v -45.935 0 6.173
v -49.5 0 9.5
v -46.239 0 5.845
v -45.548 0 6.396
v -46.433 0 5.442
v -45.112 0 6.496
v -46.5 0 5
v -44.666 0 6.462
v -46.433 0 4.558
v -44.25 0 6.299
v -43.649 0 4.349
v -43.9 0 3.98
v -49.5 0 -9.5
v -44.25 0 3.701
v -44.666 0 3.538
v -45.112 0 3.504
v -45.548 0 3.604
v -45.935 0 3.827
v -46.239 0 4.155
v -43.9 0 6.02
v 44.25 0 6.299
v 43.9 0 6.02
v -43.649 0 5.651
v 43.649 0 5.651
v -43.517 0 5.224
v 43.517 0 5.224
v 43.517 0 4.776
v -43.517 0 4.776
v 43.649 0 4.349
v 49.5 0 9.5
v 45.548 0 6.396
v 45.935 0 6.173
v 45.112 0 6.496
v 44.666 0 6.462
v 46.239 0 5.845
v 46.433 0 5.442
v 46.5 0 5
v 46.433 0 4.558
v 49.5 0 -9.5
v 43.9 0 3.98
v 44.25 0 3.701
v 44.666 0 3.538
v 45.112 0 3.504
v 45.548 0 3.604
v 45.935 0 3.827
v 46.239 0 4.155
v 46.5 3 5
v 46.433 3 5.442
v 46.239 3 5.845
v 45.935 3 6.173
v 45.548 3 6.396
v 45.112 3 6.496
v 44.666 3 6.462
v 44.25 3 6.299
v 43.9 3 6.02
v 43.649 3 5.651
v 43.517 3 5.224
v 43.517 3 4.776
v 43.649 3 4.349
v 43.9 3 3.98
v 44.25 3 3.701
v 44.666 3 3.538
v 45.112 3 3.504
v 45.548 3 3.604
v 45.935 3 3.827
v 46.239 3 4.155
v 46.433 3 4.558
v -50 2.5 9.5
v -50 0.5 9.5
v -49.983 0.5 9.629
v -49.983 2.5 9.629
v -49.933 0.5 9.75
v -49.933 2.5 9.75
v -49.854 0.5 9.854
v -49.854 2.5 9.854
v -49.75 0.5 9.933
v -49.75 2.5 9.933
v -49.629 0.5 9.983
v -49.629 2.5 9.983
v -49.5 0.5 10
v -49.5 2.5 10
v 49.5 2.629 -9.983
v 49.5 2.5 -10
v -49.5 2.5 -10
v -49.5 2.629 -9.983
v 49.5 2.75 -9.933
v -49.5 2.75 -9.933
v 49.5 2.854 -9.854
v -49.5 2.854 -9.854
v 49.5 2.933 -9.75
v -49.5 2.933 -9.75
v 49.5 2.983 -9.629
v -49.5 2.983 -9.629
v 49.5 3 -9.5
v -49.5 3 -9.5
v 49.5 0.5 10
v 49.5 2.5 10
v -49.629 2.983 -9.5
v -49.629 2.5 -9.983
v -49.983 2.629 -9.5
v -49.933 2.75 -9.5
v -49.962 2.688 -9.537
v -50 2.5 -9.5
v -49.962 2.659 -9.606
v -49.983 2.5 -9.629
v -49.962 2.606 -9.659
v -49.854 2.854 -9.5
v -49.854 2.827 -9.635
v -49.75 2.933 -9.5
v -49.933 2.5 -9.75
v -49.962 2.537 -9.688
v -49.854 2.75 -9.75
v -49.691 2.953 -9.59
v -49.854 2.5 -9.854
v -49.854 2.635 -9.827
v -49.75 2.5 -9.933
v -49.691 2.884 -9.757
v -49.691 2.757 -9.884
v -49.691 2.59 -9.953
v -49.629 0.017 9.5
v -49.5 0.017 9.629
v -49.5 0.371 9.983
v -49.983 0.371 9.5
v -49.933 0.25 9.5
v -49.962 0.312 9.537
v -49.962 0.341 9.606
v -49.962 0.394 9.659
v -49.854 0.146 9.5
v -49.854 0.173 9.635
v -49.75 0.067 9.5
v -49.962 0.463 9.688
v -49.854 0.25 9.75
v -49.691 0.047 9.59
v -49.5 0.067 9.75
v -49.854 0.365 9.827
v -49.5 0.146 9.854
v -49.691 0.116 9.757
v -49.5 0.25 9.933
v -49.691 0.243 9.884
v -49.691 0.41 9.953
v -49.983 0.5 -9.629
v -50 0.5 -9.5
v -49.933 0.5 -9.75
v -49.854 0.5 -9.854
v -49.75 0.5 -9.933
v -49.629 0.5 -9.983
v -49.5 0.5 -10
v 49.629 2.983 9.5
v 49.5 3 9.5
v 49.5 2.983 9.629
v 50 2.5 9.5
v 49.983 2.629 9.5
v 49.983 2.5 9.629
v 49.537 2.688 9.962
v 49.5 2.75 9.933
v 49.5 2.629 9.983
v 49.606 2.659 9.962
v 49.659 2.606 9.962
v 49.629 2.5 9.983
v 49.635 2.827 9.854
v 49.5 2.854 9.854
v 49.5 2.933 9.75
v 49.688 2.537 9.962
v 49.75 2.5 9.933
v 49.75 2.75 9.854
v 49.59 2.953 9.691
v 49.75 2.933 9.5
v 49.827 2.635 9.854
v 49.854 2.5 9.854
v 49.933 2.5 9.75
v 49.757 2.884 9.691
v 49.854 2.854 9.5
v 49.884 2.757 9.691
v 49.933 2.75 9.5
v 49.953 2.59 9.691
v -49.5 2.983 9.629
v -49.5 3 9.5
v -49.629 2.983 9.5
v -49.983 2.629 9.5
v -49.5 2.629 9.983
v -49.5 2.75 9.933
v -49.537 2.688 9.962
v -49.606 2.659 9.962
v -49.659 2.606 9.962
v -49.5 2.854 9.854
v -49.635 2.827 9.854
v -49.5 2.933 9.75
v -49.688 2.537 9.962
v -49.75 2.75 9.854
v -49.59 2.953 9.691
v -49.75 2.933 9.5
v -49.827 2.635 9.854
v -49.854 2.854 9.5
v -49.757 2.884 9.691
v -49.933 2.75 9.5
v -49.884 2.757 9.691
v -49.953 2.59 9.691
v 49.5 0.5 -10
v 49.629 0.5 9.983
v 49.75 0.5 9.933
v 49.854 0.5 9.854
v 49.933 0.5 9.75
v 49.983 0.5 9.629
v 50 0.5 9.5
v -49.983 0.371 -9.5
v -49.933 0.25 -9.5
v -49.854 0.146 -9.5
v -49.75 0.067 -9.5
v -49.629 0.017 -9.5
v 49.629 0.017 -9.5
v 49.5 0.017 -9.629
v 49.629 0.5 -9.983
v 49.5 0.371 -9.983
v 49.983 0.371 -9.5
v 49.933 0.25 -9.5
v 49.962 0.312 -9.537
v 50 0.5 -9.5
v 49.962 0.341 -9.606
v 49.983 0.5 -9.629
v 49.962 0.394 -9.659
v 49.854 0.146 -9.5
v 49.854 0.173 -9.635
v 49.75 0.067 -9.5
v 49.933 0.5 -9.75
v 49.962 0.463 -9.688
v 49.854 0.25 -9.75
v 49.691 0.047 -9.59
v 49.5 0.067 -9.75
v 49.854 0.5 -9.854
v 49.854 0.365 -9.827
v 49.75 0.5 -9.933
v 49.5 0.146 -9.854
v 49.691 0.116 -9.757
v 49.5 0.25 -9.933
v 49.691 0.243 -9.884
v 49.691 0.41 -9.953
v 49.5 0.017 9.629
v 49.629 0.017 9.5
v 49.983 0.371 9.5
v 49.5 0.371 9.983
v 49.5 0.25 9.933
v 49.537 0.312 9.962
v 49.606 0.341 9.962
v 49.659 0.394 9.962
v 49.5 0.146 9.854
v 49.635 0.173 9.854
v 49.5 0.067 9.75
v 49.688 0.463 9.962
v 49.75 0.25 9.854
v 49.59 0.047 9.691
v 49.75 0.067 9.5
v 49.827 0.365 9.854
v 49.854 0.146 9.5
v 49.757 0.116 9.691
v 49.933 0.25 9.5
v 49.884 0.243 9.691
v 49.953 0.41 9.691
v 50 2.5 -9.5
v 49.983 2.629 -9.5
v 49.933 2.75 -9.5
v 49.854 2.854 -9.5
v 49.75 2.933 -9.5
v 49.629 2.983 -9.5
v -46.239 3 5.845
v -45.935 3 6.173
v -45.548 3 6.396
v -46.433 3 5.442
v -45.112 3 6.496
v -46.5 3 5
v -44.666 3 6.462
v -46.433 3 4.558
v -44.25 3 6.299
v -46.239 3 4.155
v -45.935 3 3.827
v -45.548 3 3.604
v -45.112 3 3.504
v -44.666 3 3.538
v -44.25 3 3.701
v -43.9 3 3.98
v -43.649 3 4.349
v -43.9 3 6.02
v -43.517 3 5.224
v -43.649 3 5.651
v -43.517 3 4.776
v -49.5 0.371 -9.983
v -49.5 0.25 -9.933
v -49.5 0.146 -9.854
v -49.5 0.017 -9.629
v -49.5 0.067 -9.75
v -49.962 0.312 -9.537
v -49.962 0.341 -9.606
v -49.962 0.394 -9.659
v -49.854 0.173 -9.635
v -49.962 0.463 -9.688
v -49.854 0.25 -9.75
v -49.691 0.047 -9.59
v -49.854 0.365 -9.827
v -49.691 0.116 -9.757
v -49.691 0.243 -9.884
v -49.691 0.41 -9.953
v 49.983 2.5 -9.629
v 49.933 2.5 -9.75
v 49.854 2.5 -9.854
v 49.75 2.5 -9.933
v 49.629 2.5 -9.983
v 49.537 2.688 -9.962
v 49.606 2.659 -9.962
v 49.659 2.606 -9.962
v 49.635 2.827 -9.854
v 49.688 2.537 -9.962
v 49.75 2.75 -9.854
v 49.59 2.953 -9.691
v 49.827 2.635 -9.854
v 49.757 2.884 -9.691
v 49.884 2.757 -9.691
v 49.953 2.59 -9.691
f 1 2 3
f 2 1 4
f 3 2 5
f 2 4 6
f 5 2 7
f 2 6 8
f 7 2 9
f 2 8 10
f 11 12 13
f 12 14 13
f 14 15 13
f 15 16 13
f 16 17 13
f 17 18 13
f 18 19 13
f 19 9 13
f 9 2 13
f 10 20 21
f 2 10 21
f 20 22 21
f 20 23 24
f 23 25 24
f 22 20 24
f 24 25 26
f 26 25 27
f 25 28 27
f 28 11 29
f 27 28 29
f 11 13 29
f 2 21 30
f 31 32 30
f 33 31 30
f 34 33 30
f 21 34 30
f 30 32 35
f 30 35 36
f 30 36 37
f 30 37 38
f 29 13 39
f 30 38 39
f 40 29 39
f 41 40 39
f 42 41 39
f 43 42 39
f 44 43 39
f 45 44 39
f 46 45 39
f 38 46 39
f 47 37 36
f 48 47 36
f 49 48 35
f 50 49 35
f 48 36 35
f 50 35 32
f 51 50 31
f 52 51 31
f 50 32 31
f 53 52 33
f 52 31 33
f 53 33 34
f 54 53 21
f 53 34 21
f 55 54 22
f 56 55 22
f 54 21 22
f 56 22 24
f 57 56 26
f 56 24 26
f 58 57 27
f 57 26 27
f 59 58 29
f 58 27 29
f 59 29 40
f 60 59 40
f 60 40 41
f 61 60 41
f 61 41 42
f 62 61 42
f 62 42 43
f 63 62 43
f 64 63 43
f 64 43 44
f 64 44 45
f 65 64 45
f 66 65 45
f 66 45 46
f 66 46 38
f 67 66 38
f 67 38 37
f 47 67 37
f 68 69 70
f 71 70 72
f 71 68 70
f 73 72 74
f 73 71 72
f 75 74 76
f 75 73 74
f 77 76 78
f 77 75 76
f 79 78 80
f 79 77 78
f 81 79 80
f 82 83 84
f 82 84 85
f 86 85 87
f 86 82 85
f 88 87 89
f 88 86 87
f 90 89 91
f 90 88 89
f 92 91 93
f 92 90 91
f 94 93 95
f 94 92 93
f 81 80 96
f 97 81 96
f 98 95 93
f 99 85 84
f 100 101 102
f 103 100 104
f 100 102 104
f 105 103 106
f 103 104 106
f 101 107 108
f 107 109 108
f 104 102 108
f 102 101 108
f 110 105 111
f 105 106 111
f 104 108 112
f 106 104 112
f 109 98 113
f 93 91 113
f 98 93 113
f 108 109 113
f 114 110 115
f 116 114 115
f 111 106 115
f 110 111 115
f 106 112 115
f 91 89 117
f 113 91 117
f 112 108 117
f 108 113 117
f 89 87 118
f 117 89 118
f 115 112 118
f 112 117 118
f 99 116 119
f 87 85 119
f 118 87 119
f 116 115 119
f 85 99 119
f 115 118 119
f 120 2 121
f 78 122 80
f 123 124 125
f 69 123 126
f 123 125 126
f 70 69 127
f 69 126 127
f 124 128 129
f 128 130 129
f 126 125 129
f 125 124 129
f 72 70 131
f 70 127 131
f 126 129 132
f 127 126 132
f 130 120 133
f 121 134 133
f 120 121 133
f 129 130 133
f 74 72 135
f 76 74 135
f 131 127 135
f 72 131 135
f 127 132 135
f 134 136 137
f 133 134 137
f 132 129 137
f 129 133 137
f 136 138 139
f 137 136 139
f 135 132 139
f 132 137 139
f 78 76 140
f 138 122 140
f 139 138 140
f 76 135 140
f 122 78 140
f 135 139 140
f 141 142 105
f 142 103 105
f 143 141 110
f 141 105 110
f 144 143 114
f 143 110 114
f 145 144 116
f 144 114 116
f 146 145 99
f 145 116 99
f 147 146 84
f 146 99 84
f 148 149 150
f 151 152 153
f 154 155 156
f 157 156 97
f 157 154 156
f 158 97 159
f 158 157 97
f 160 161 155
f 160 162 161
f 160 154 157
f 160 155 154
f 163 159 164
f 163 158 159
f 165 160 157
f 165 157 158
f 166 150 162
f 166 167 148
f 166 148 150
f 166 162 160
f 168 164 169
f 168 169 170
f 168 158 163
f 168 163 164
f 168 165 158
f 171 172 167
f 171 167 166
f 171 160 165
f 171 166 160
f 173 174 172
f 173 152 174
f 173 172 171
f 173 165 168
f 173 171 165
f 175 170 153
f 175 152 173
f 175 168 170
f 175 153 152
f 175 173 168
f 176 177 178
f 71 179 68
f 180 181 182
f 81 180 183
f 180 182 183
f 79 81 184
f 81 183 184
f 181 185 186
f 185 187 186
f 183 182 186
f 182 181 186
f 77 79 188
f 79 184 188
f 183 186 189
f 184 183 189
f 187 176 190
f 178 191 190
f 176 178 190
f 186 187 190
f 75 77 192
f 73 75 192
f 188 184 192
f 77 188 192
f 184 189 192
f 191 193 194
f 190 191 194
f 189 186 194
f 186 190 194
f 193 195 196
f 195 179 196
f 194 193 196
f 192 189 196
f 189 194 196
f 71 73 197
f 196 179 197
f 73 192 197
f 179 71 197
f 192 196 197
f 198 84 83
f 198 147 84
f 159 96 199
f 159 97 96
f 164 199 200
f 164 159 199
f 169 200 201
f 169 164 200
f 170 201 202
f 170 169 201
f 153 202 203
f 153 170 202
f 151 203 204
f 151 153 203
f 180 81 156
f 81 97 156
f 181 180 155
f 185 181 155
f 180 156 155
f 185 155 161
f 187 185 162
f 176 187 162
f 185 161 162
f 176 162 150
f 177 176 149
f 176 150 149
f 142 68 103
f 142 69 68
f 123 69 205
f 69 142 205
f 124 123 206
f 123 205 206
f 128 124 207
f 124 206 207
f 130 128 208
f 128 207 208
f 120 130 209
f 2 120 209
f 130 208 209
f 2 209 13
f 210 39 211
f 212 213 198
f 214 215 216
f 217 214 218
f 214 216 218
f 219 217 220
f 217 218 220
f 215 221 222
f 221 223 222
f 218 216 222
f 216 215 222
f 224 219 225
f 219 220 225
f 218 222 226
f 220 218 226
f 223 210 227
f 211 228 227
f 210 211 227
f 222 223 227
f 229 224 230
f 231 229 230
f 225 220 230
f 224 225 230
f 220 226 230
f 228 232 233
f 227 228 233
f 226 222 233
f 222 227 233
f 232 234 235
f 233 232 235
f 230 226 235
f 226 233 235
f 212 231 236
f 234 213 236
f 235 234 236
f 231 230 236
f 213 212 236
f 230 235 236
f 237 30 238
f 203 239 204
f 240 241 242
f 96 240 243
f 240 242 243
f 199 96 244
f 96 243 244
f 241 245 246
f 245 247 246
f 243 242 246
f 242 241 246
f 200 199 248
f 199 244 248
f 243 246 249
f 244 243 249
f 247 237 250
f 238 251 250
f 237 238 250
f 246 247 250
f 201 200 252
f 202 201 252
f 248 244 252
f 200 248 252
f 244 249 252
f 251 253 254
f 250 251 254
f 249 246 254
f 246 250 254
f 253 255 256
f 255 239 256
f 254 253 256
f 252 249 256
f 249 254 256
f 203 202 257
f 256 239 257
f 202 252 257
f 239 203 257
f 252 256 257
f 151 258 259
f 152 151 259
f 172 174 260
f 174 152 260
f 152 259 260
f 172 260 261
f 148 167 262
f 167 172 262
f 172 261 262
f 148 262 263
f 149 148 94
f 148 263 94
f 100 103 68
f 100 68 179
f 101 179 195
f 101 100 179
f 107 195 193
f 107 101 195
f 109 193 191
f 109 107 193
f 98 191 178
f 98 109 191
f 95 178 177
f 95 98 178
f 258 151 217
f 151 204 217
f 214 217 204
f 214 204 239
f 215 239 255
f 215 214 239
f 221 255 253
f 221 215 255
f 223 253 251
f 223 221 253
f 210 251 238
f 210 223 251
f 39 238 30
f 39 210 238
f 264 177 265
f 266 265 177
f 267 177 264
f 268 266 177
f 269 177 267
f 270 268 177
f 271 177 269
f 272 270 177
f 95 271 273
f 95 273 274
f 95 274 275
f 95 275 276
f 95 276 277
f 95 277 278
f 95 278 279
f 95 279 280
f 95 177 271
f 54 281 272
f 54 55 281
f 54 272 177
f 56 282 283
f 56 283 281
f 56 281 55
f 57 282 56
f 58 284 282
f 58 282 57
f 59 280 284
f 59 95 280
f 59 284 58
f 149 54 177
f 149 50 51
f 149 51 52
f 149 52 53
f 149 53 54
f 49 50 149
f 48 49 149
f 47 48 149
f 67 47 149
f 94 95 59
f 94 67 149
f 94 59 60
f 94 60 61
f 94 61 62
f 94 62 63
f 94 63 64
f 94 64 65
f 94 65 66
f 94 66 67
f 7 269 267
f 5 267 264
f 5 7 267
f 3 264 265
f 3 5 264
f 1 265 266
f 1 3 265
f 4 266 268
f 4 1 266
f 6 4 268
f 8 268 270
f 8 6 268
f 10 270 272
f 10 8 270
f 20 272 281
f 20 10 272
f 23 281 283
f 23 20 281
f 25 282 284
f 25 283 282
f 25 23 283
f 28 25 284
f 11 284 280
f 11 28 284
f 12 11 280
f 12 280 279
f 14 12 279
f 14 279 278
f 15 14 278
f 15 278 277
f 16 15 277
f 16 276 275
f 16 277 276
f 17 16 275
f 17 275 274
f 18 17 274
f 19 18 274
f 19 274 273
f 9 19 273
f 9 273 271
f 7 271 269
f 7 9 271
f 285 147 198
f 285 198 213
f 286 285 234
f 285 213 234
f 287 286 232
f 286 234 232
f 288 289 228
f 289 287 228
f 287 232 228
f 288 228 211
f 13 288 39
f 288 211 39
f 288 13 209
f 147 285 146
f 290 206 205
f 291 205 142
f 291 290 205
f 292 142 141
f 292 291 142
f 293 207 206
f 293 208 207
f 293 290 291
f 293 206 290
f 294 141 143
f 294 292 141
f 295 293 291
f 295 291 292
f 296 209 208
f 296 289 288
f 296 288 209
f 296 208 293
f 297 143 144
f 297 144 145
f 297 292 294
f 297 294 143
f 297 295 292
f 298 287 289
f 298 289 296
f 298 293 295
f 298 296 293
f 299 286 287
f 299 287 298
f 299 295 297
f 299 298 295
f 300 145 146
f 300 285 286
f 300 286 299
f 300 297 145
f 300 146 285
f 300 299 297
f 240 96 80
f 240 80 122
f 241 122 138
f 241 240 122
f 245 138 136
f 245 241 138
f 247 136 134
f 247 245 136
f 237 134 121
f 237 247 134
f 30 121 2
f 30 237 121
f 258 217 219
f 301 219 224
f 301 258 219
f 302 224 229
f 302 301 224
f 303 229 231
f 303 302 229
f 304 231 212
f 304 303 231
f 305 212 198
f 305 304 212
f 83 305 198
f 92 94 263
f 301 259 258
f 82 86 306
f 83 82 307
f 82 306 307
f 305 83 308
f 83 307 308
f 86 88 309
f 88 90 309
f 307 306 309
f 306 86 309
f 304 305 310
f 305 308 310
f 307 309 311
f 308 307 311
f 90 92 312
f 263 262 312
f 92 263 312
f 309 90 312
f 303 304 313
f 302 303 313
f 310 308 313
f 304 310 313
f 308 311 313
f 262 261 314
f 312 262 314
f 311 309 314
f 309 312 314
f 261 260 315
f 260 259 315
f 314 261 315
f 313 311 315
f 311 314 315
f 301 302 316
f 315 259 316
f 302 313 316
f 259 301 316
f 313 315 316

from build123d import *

# Parameters (mm, degrees)
SKETCH1_W           = 100
SKETCH1_H           = 20
BOSS_EXTRUDE1_DEPTH = 3
FILLET1_R           = 0.5
SKETCH2_R           = 1.5
CUT_EXTRUDE1_DEPTH  = 4


with BuildPart() as part:
    # Sketch1 → Boss-Extrude1 (new body)
    with BuildSketch(Plane(origin=(0, 0, 0), x_dir=(1, 0, 0), z_dir=(0, 1, 0))):
        Rectangle(SKETCH1_W, SKETCH1_H)
    extrude(amount=BOSS_EXTRUDE1_DEPTH)

    # Fillet1
    fillet1_edges = [part.edges().sort_by_distance(p)[0] for p in [
        (50, 3, 0),
        (0, 3, -10),
        (-50, 3, 0),
        (0, 0, -10),
        (50, 0, 0),
        (0, 0, 10),
        (-50, 0, 0),
        (0, 3, 10),
        (-50, 1.5, -10),
        (50, 1.5, -10),
        (50, 1.5, 10),
        (-50, 1.5, 10),
    ]]
    fillet(fillet1_edges, radius=FILLET1_R)

    # Sketch2 → Cut-Extrude1 (cut, through all)
    with BuildSketch(Plane.XZ):
        with Locations((45, 5)):
            Circle(SKETCH2_R)
    cut_extrude1 = extrude(amount=-CUT_EXTRUDE1_DEPTH, mode=Mode.SUBTRACT)

    # Mirror1: Cut-Extrude1 across plane
    add(cut_extrude1.mirror(Plane(origin=(0, 0, 0), x_dir=(0, 0, 1), z_dir=(1, 0, 0))), mode=Mode.SUBTRACT)


solid = part.part
